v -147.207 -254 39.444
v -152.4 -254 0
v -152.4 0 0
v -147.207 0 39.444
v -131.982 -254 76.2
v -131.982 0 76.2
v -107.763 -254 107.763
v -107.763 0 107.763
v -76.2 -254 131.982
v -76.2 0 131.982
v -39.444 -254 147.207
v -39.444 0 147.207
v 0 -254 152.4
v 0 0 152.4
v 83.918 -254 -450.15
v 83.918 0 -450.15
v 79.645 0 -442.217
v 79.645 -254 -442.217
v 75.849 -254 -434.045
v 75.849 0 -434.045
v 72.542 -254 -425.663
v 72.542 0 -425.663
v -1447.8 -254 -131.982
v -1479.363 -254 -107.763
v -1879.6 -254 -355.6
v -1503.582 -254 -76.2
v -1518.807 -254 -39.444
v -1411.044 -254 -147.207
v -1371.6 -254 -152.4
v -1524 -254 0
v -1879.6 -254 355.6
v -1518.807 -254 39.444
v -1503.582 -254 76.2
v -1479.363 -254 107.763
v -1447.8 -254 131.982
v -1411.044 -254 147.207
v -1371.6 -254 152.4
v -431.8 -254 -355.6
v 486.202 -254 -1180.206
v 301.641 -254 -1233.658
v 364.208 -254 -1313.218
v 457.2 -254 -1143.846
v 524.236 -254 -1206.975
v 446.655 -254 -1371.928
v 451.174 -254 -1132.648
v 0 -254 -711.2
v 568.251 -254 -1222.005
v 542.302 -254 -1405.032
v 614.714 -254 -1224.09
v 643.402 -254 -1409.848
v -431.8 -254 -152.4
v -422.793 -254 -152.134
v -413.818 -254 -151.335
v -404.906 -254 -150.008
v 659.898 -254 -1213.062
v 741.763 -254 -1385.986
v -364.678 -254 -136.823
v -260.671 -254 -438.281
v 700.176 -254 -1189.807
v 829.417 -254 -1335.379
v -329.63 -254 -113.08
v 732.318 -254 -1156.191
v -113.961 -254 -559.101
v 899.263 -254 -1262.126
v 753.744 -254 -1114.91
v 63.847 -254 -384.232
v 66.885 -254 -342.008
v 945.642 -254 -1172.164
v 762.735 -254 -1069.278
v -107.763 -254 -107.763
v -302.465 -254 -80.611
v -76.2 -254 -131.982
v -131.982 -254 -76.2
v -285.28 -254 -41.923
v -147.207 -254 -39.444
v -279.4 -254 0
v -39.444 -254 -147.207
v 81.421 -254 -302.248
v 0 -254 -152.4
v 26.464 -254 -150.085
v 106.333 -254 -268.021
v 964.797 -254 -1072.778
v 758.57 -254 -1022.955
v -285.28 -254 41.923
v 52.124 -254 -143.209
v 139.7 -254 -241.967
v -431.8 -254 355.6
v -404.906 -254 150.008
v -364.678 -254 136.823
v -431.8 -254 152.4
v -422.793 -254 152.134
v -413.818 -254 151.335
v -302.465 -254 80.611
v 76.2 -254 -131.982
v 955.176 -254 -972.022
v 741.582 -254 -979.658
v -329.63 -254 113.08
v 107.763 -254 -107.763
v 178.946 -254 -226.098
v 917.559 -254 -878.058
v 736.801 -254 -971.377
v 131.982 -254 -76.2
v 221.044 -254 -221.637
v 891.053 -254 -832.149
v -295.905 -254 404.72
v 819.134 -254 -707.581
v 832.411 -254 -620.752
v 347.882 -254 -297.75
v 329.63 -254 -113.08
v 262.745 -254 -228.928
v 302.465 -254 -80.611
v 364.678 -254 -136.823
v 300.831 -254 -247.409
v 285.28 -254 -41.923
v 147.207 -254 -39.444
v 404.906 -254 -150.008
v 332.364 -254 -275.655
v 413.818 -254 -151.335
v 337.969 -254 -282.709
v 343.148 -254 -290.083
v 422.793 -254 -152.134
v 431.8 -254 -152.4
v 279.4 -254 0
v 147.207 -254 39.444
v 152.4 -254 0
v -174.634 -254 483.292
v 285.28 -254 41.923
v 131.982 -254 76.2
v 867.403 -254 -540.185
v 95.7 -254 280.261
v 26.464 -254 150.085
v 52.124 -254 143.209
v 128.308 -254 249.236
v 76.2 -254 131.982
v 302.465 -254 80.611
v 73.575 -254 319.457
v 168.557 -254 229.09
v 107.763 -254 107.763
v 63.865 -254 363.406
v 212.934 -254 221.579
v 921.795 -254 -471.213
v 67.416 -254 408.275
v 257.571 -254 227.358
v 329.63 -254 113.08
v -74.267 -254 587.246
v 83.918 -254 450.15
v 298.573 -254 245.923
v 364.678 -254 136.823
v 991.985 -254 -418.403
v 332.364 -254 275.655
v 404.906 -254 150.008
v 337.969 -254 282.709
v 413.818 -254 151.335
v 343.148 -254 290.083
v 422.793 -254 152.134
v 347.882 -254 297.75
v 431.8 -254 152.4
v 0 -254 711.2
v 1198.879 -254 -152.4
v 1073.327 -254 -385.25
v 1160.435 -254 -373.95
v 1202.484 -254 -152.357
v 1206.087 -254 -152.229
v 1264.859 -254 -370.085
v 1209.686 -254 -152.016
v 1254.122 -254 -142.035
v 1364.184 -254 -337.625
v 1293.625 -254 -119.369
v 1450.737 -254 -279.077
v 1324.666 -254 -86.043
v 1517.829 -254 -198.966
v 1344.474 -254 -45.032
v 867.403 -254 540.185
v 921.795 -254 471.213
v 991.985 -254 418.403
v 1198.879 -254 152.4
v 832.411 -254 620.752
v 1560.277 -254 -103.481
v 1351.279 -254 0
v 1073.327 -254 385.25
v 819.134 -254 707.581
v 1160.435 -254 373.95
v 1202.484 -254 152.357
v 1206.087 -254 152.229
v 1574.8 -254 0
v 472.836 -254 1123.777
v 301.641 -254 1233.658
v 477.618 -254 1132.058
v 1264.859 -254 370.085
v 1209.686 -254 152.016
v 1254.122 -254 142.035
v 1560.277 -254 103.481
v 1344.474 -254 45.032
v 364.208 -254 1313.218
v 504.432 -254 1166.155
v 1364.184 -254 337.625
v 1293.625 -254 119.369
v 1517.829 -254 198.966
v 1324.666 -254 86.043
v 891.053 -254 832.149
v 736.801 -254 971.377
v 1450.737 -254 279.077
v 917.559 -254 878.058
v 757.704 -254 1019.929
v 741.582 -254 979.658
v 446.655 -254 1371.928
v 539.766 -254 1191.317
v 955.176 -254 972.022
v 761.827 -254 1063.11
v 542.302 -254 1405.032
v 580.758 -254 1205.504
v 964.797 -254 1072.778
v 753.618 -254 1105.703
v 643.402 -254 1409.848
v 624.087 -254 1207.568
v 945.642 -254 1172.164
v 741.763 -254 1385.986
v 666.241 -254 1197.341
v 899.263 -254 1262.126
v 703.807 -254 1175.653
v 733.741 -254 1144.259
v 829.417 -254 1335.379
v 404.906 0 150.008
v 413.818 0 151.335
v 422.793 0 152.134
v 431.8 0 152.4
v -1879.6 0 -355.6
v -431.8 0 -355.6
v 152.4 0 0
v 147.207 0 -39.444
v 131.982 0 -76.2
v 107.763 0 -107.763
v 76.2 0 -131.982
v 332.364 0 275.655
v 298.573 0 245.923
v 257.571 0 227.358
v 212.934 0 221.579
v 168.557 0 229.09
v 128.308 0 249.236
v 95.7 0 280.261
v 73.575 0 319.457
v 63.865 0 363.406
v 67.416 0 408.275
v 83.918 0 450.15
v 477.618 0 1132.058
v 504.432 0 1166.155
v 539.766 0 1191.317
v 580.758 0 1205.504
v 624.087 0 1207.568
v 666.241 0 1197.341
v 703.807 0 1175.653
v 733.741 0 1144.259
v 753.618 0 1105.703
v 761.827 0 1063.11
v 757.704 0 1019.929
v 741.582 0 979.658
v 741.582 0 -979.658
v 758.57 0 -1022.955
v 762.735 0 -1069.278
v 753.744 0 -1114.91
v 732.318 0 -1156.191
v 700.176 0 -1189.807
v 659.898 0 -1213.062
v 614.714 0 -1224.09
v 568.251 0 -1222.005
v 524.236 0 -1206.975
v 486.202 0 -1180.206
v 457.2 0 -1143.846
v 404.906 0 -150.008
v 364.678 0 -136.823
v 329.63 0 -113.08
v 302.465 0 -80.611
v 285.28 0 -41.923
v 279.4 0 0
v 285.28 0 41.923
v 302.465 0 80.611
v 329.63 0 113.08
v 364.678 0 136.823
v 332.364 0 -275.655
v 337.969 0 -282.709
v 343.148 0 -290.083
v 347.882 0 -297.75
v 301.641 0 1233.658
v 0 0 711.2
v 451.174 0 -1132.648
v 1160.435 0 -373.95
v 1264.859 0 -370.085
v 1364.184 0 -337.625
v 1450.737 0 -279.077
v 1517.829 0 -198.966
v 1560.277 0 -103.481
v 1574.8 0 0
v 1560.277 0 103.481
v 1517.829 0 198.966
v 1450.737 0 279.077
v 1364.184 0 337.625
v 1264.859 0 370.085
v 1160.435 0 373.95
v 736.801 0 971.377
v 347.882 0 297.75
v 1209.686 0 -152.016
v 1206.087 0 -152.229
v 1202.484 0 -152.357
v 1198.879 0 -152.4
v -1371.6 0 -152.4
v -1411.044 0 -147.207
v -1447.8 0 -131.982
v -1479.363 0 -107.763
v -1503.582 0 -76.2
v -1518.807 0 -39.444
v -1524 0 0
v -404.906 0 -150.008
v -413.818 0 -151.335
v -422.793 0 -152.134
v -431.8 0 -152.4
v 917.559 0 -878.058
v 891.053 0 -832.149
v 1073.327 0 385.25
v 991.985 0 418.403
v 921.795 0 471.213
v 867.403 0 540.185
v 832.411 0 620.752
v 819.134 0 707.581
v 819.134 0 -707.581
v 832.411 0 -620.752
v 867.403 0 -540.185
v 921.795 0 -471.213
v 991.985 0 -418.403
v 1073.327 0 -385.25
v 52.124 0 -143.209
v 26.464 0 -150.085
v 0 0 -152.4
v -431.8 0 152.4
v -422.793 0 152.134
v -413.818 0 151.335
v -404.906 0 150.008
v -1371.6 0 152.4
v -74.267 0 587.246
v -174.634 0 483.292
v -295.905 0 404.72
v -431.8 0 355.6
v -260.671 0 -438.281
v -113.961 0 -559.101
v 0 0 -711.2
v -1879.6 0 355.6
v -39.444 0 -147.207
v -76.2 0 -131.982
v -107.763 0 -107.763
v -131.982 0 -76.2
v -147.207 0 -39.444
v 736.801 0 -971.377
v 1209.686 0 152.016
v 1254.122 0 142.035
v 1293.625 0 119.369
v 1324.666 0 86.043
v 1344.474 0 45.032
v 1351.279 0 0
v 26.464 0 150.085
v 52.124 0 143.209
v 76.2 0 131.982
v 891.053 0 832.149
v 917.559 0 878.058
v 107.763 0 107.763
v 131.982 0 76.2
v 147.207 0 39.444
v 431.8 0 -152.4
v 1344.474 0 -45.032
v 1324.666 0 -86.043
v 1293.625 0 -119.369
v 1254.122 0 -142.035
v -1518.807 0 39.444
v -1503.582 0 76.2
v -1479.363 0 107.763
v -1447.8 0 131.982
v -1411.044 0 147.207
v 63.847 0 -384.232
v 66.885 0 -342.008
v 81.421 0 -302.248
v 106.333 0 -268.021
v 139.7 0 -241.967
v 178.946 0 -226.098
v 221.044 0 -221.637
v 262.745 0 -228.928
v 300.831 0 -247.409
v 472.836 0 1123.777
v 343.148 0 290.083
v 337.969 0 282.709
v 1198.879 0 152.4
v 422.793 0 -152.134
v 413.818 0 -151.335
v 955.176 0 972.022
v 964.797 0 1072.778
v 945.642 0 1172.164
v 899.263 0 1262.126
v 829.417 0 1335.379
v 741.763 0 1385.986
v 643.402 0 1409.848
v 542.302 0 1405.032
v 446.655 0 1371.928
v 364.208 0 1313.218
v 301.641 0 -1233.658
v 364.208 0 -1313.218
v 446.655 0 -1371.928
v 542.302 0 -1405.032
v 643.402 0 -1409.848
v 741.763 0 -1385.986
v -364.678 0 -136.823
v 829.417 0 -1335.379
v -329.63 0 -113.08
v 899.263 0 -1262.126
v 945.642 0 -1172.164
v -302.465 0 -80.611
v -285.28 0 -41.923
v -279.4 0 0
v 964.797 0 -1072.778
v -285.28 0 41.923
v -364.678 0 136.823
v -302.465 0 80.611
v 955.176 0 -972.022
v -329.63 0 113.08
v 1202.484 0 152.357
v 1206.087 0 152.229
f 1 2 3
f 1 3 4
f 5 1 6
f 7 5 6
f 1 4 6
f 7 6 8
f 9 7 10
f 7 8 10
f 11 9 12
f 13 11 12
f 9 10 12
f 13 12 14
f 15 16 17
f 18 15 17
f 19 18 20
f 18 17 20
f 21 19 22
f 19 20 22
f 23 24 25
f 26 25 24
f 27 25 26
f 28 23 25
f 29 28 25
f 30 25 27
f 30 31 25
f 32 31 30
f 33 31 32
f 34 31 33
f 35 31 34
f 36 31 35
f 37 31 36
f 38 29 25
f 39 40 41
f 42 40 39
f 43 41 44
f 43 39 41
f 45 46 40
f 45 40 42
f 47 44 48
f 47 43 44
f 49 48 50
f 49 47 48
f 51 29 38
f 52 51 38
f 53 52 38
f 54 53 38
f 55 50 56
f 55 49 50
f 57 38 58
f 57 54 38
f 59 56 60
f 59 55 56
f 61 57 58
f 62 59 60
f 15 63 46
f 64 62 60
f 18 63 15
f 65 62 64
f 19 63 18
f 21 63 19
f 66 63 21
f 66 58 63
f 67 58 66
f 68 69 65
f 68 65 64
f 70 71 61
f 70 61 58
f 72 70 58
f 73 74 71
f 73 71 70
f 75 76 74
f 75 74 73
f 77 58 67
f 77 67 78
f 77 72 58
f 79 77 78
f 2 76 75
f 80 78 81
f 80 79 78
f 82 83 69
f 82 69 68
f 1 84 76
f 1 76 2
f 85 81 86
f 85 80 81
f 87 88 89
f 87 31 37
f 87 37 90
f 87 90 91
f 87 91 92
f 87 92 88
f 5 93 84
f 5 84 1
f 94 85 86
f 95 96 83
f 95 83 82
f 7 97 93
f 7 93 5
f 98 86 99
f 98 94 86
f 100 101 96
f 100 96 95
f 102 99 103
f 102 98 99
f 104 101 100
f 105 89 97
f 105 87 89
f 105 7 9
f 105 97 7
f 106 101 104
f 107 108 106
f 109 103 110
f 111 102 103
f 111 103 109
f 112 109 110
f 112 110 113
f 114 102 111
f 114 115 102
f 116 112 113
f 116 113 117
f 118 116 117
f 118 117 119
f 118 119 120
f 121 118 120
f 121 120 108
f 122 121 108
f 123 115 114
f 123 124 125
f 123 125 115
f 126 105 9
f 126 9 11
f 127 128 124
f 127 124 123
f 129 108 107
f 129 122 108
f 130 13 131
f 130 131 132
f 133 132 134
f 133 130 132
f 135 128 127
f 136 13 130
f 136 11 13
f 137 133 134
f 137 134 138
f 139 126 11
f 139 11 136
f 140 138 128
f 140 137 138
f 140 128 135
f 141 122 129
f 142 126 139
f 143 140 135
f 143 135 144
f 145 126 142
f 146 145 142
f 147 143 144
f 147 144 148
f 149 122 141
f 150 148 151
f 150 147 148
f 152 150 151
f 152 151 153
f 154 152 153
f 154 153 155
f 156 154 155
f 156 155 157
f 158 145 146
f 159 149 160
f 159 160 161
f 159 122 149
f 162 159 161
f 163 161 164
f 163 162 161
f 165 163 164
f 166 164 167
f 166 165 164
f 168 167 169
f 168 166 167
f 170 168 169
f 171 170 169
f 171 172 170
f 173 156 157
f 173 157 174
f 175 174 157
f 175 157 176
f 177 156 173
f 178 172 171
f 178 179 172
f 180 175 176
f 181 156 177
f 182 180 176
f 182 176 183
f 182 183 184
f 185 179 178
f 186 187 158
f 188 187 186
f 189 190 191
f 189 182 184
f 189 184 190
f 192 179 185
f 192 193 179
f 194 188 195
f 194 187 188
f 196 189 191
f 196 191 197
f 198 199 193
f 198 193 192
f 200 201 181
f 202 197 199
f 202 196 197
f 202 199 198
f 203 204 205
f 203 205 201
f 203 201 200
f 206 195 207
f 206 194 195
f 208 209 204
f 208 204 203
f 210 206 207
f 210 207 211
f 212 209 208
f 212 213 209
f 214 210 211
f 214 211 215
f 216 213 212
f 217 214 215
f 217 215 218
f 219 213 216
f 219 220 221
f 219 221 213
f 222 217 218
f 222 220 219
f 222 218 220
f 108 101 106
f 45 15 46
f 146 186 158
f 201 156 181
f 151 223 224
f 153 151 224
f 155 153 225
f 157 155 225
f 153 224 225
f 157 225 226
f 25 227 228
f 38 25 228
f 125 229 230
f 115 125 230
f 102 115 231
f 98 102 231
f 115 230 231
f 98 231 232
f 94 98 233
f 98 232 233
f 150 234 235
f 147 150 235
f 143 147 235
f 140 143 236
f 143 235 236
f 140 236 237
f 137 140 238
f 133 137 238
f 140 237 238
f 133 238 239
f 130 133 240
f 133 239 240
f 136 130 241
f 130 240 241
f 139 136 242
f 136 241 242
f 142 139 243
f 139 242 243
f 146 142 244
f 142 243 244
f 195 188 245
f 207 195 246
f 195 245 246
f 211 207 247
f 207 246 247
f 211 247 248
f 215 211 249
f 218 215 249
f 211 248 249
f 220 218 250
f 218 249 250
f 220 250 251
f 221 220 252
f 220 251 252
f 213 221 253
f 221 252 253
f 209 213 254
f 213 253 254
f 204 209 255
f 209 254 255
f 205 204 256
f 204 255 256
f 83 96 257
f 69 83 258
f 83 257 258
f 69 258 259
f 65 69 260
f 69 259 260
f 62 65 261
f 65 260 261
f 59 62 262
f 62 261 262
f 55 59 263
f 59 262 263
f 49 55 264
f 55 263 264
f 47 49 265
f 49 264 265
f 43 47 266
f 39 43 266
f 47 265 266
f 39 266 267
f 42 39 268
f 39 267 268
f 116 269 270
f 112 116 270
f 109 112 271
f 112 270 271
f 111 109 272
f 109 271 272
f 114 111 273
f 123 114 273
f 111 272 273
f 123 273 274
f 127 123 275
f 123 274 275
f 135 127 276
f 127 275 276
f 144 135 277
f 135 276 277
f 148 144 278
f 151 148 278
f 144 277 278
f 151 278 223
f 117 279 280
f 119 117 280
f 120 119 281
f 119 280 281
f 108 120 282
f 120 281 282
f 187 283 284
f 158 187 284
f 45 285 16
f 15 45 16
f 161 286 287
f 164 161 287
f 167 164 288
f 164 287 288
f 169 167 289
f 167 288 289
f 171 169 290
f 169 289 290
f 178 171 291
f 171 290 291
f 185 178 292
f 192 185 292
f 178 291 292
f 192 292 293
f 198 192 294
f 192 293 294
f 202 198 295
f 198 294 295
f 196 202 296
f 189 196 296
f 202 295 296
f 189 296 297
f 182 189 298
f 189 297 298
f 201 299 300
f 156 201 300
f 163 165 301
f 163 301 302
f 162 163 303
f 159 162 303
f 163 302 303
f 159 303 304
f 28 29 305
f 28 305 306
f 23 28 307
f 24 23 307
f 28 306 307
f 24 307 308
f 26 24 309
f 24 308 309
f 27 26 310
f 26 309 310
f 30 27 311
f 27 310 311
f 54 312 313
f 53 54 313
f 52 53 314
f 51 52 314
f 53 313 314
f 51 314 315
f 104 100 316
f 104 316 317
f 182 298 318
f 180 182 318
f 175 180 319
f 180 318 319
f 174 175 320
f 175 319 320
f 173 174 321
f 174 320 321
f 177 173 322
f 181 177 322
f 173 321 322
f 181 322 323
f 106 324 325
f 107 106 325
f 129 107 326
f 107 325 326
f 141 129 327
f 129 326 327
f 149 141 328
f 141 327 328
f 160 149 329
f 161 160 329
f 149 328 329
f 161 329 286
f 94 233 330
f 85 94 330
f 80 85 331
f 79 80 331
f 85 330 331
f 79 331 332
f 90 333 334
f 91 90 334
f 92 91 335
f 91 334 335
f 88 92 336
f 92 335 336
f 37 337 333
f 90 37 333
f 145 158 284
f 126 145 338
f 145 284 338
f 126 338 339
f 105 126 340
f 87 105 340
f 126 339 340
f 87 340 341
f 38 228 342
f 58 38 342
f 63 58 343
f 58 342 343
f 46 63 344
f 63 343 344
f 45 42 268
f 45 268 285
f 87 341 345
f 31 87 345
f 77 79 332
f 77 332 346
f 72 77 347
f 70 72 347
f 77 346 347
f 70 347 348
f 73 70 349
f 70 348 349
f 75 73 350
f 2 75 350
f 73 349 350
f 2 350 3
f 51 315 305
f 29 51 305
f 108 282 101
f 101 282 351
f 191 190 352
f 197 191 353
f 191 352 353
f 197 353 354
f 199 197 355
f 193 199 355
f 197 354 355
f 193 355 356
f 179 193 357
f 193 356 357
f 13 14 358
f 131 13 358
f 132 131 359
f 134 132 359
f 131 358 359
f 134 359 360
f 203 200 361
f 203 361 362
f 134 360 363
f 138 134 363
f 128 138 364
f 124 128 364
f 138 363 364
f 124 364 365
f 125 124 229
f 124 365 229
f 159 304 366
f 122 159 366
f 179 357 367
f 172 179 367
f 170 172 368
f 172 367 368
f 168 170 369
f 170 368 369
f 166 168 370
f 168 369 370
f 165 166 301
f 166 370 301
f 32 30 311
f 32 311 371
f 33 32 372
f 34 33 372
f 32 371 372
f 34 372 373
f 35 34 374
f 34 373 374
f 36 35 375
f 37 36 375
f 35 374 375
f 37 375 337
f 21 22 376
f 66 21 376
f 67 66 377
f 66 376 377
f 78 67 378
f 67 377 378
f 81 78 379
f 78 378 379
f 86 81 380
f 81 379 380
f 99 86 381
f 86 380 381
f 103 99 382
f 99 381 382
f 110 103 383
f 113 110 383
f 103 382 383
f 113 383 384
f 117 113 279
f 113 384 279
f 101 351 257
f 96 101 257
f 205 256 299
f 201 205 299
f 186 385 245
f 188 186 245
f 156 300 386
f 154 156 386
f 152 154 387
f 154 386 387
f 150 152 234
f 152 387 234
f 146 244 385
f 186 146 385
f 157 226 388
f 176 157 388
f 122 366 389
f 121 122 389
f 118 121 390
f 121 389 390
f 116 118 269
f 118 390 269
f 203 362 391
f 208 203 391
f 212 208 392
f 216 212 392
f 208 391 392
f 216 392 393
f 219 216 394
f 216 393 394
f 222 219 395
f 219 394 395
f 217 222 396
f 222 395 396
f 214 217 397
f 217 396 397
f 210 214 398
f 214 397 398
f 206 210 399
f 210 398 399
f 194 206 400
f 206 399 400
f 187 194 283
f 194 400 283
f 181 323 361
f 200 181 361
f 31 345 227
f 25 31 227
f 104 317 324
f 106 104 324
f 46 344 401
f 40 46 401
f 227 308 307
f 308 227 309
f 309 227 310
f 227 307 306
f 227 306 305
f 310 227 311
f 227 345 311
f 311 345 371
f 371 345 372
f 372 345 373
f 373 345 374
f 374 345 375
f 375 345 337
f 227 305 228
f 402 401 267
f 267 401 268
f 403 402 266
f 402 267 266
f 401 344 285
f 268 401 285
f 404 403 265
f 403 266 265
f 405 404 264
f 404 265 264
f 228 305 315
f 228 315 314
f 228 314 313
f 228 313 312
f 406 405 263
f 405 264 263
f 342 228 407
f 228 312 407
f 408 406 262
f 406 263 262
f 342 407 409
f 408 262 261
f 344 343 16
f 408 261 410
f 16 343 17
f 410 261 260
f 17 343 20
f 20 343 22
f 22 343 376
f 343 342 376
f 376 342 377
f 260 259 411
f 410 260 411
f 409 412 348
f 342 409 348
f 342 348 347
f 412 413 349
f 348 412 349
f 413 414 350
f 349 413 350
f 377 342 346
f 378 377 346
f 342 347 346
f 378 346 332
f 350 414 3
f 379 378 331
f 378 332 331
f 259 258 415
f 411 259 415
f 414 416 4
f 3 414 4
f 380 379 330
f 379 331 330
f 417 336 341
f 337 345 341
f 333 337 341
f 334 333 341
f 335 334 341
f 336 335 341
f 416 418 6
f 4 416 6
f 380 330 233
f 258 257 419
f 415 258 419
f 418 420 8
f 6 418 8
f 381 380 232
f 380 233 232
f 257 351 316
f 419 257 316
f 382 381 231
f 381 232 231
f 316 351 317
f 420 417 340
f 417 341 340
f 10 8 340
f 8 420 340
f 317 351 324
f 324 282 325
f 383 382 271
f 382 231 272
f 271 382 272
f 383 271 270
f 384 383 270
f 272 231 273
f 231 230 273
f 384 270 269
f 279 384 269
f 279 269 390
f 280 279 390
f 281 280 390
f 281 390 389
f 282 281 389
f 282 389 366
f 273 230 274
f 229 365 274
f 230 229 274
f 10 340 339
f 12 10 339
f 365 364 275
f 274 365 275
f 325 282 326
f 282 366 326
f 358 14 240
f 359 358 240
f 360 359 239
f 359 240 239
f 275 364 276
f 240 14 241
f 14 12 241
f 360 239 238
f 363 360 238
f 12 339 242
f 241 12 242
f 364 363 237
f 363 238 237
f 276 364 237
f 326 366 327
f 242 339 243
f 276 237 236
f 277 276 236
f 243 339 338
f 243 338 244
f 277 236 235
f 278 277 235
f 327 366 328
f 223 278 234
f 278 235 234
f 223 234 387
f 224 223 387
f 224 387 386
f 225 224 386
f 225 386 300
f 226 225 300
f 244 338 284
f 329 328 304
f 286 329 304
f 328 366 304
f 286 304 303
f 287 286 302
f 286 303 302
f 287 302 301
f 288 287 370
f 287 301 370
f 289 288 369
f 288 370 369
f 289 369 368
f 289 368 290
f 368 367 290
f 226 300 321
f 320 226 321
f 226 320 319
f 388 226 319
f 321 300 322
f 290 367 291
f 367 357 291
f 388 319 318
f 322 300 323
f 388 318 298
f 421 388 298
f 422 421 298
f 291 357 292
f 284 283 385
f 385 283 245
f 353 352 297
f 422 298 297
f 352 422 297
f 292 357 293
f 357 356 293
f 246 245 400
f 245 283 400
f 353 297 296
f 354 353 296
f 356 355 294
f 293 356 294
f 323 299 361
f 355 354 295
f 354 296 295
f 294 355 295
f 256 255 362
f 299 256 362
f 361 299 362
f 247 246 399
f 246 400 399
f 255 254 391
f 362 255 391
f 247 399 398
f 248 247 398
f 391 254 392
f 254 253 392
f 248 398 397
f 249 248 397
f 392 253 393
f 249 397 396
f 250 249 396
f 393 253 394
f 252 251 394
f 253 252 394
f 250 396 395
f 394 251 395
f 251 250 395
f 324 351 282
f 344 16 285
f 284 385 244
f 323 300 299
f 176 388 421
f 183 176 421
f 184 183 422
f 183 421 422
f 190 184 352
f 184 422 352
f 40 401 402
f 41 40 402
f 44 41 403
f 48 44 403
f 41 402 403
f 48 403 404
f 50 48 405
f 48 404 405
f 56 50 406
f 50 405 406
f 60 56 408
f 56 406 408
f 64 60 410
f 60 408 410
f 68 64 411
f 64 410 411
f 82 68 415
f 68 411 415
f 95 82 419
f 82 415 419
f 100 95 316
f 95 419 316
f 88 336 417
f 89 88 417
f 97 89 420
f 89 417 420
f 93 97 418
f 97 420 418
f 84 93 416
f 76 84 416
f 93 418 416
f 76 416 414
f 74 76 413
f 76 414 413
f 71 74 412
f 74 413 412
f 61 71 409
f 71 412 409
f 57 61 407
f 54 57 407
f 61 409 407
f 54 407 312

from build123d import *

# Parameters (mm, degrees)
F1_DEPTH = 254


with BuildPart() as f1:
    # F0 (on Front) → F1 (new body)
    with BuildSketch(Plane.XZ):
        with BuildLine():
            ThreePointArc((1160.4353536497, 373.9497693541), (1190.2445719567, 264.1334869485), (1209.6857689596, 152.0163819353))
            ThreePointArc((1209.6857689596, 152.0163819353), (1310.3976121316, 103.8721694551), (1351.2793068509, 0))
            Line((1351.2793068509, 0), (1574.8, 0))
            ThreePointArc((1574.8, 0), (1450.736895582, 279.0772698309), (1160.4353536497, 373.9497693541))
        make_face()
        with BuildLine():
            ThreePointArc((736.8010212461, 971.3768038669), (816.8986691145, 905.0553598532), (891.0532399748, 832.1494838852))
            Line((891.0532399748, 832.1494838852), (917.5586335857, 878.058172294))
            Line((917.5586335857, 878.058172294), (741.5822715367, 979.658172294))
            Line((741.5822715367, 979.658172294), (736.8010212461, 971.3768038669))
        make_face()
        with BuildLine():
            Line((477.6177284633, 1132.058172294), (301.6413664143, 1233.658172294))
            Line((301.6413664143, 1233.658172294), (275.1359728033, 1187.7494838852))
            ThreePointArc((275.1359728033, 1187.7494838852), (375.3515989068, 1159.9826796975), (472.8364781726, 1123.7768038669))
            Line((472.8364781726, 1123.7768038669), (477.6177284633, 1132.058172294))
        make_face()
        with BuildLine():
            Line((275.1359728033, -1187.7494838852), (301.6413664143, -1233.658172294))
            Line((301.6413664143, -1233.658172294), (457.2, -1143.8463533185))
            Line((457.2, -1143.8463533185), (451.1739193379, -1132.647665653))
            ThreePointArc((451.1739193379, -1132.647665653), (364.1985275213, -1163.5325833647), (275.1359728033, -1187.7494838852))
        make_face()
        with BuildLine():
            Line((917.5586335857, -878.058172294), (891.0532399748, -832.1494838852))
            ThreePointArc((891.0532399748, -832.1494838852), (816.8986691145, -905.0553598532), (736.8010212461, -971.3768038669))
            Line((736.8010212461, -971.3768038669), (741.5822715367, -979.658172294))
            Line((741.5822715367, -979.658172294), (917.5586335857, -878.058172294))
        make_face()
        with BuildLine():
            ThreePointArc((1351.2793068509, 0), (1310.3976121316, -103.8721694551), (1209.6857689596, -152.0163819353))
            ThreePointArc((1209.6857689596, -152.0163819353), (1190.2445719567, -264.1334869485), (1160.4353536497, -373.9497693541))
            ThreePointArc((1160.4353536497, -373.9497693541), (1450.736895582, -279.0772698309), (1574.8, 0))
            Line((1574.8, 0), (1351.2793068509, 0))
        make_face()
        with BuildLine():
            Line((741.5822715367, 979.658172294), (917.5586335857, 878.058172294))
            ThreePointArc((917.5586335857, 878.058172294), (787.4, 1363.8168058797), (301.6413664143, 1233.658172294))
            Line((301.6413664143, 1233.658172294), (477.6177284633, 1132.058172294))
            ThreePointArc((477.6177284633, 1132.058172294), (685.8, 1187.8404438307), (741.5822715367, 979.658172294))
        make_face()
        with BuildLine():
            ThreePointArc((301.6413664143, -1233.658172294), (787.4, -1363.8168058797), (917.5586335857, -878.058172294))
            Line((917.5586335857, -878.058172294), (741.5822715367, -979.658172294))
            ThreePointArc((741.5822715367, -979.658172294), (680.8645597623, -1202.8683726303), (457.2, -1143.8463533185))
            Line((457.2, -1143.8463533185), (301.6413664143, -1233.658172294))
        make_face()
        with BuildLine():
            Line((391.876362049, 373.9497693541), (1160.4353536497, 373.9497693541))
            ThreePointArc((1160.4353536497, 373.9497693541), (921.7950857099, 471.2128883299), (819.1336335857, 707.581071559))
            Line((819.1336335857, 707.581071559), (891.0532399748, 832.1494838852))
            ThreePointArc((891.0532399748, 832.1494838852), (816.8986691145, 905.0553598532), (736.8010212461, 971.3768038669))
            Line((736.8010212461, 971.3768038669), (391.876362049, 373.9497693541))
        make_face()
        with BuildLine():
            ThreePointArc((-1209.6374994187, 152.4), (-1192.2502680214, 254.9273198443), (-1166.1892127781, 355.6))
            Line((-1166.1892127781, 355.6), (-1879.6, 355.6))
            Line((-1879.6, 355.6), (-1879.6, 0))
            Line((-1879.6, 0), (-1524, 0))
            ThreePointArc((-1524, 0), (-1479.3630734528, 107.7630734528), (-1371.6, 152.4))
            Line((-1371.6, 152.4), (-1209.6374994187, 152.4))
        make_face()
        with BuildLine():
            Line((-1879.6, -355.6), (-1166.1892127781, -355.6))
            ThreePointArc((-1166.1892127781, -355.6), (-1192.2502680214, -254.9273198443), (-1209.6374994187, -152.4))
            Line((-1209.6374994187, -152.4), (-1371.6, -152.4))
            ThreePointArc((-1371.6, -152.4), (-1479.3630734528, -107.7630734528), (-1524, 0))
            Line((-1524, 0), (-1879.6, 0))
            Line((-1879.6, 0), (-1879.6, -355.6))
        make_face()
        with BuildLine():
            ThreePointArc((0, 431.8), (36.4005750014, 430.2629871829), (72.5420108165, 425.6628908734))
            ThreePointArc((72.5420108165, 425.6628908734), (77.6865180317, 438.1587516089), (83.9177284633, 450.1497693541))
            Line((83.9177284633, 450.1497693541), (472.8364781726, 1123.7768038669))
            ThreePointArc((472.8364781726, 1123.7768038669), (375.3515989068, 1159.9826796975), (275.1359728033, 1187.7494838852))
            Line((275.1359728033, 1187.7494838852), (0, 711.2))
            Line((0, 711.2), (0, 431.8))
        make_face()
        with BuildLine():
            ThreePointArc((-404.9058823529, 150.008221228), (-246.655316255, 354.4183897079), (0, 431.8))
            Line((0, 431.8), (0, 711.2))
            ThreePointArc((0, 711.2), (-174.6344256589, 483.2918025858), (-431.8, 355.6))
            Line((-431.8, 355.6), (-1166.1892127781, 355.6))
            ThreePointArc((-1166.1892127781, 355.6), (-1192.2502680214, 254.9273198443), (-1209.6374994187, 152.4))
            Line((-1209.6374994187, 152.4), (-431.8, 152.4))
            ThreePointArc((-431.8, 152.4), (-418.2998687996, 151.8008776575), (-404.9058823529, 150.008221228))
        make_face()
        with BuildLine():
            Line((0, -711.2), (0, -431.8))
            ThreePointArc((0, -431.8), (-246.655316255, -354.4183897079), (-404.9058823529, -150.008221228))
            ThreePointArc((-404.9058823529, -150.008221228), (-418.2998687996, -151.8008776575), (-431.8, -152.4))
            Line((-431.8, -152.4), (-1209.6374994187, -152.4))
            ThreePointArc((-1209.6374994187, -152.4), (-1192.2502680214, -254.9273198443), (-1166.1892127781, -355.6))
            Line((-1166.1892127781, -355.6), (-431.8, -355.6))
            ThreePointArc((-431.8, -355.6), (-183.7043920276, -494.3053331764), (0, -711.2))
        make_face()
        with BuildLine():
            ThreePointArc((83.9177284633, -450.1497693541), (77.6865180317, -438.1587516089), (72.5420108165, -425.6628908734))
            ThreePointArc((72.5420108165, -425.6628908734), (36.4005750014, -430.2629871829), (0, -431.8))
            Line((0, -431.8), (0, -711.2))
            Line((0, -711.2), (275.1359728033, -1187.7494838852))
            ThreePointArc((275.1359728033, -1187.7494838852), (364.1985275213, -1163.5325833647), (451.1739193379, -1132.647665653))
            Line((451.1739193379, -1132.647665653), (83.9177284633, -450.1497693541))
        make_face()
        with BuildLine():
            ThreePointArc((1198.8793068509, 152.4), (1204.285941343, 152.3040652887), (1209.6857689596, 152.0163819353))
            ThreePointArc((1209.6857689596, 152.0163819353), (1190.2445719567, 264.1334869485), (1160.4353536497, 373.9497693541))
            Line((1160.4353536497, 373.9497693541), (391.876362049, 373.9497693541))
            Line((391.876362049, 373.9497693541), (347.8822715367, 297.7497693541))
            ThreePointArc((347.8822715367, 297.7497693541), (340.6133507679, 286.3578739515), (332.3638715364, 275.6546696454))
            ThreePointArc((332.3638715364, 275.6546696454), (373.9497693541, 215.9), (404.9058823529, 150.008221228))
            ThreePointArc((404.9058823529, 150.008221228), (418.2998687996, 151.8008776575), (431.8, 152.4))
            Line((431.8, 152.4), (1198.8793068509, 152.4))
        make_face()
        with BuildLine():
            ThreePointArc((1160.4353536497, -373.9497693541), (1190.2445719567, -264.1334869485), (1209.6857689596, -152.0163819353))
            ThreePointArc((1209.6857689596, -152.0163819353), (1204.285941343, -152.3040652887), (1198.8793068509, -152.4))
            Line((1198.8793068509, -152.4), (431.8, -152.4))
            ThreePointArc((431.8, -152.4), (418.2998687996, -151.8008776575), (404.9058823529, -150.008221228))
            ThreePointArc((404.9058823529, -150.008221228), (373.9497693541, -215.9), (332.3638715364, -275.6546696454))
            ThreePointArc((332.3638715364, -275.6546696454), (340.6133507679, -286.3578739515), (347.8822715367, -297.7497693541))
            Line((347.8822715367, -297.7497693541), (391.876362049, -373.9497693541))
            Line((391.876362049, -373.9497693541), (1160.4353536497, -373.9497693541))
        make_face()
        with BuildLine():
            ThreePointArc((-404.9058823529, -150.008221228), (-246.655316255, -354.4183897079), (0, -431.8))
            Line((0, -431.8), (0, -152.4))
            ThreePointArc((0, -152.4), (-107.7630734528, -107.7630734528), (-152.4, 0))
            Line((-152.4, 0), (-279.4, 0))
            ThreePointArc((-279.4, 0), (-314.9145356997, -97.793395663), (-404.9058823529, -150.008221228))
        make_face()
        with BuildLine():
            Line((0, 152.4), (0, 431.8))
            ThreePointArc((0, 431.8), (-246.655316255, 354.4183897079), (-404.9058823529, 150.008221228))
            ThreePointArc((-404.9058823529, 150.008221228), (-314.9145356997, 97.793395663), (-279.4, 0))
            Line((-279.4, 0), (-152.4, 0))
            ThreePointArc((-152.4, 0), (-107.7630734528, 107.7630734528), (0, 152.4))
        make_face()
        with BuildLine():
            ThreePointArc((279.4, 0), (314.9145356997, 97.793395663), (404.9058823529, 150.008221228))
            ThreePointArc((404.9058823529, 150.008221228), (373.9497693541, 215.9), (332.3638715364, 275.6546696454))
            ThreePointArc((332.3638715364, 275.6546696454), (242.1488328163, 223.8272901054), (139.7, 241.9674978174))
            Line((139.7, 241.9674978174), (76.2, 131.9822715367))
            ThreePointArc((76.2, 131.9822715367), (131.9822715367, 76.2), (152.4, 0))
            Line((152.4, 0), (279.4, 0))
        make_face()
        with BuildLine():
            ThreePointArc((139.7, 241.9674978174), (72.7657028834, 321.6206857684), (72.5420108165, 425.6628908734))
            ThreePointArc((72.5420108165, 425.6628908734), (36.4005750014, 430.2629871829), (0, 431.8))
            Line((0, 431.8), (0, 152.4))
            ThreePointArc((0, 152.4), (39.4440224736, 147.2070959265), (76.2, 131.9822715367))
            Line((76.2, 131.9822715367), (139.7, 241.9674978174))
        make_face()
        with BuildLine():
            ThreePointArc((332.3638715364, -275.6546696454), (373.9497693541, -215.9), (404.9058823529, -150.008221228))
            ThreePointArc((404.9058823529, -150.008221228), (314.9145356997, -97.793395663), (279.4, 0))
            Line((279.4, 0), (152.4, 0))
            ThreePointArc((152.4, 0), (131.9822715367, -76.2), (76.2, -131.9822715367))
            Line((76.2, -131.9822715367), (139.7, -241.9674978174))
            ThreePointArc((139.7, -241.9674978174), (242.1488328163, -223.8272901054), (332.3638715364, -275.6546696454))
        make_face()
        with BuildLine():
            ThreePointArc((0, -431.8), (36.4005750014, -430.2629871829), (72.5420108165, -425.6628908734))
            ThreePointArc((72.5420108165, -425.6628908734), (72.7657028834, -321.6206857684), (139.7, -241.9674978174))
            Line((139.7, -241.9674978174), (76.2, -131.9822715367))
            ThreePointArc((76.2, -131.9822715367), (39.4440224736, -147.2070959265), (0, -152.4))
            Line((0, -152.4), (0, -431.8))
        make_face()
        with BuildLine():
            ThreePointArc((819.1336335857, -707.581071559), (921.7950857099, -471.2128883299), (1160.4353536497, -373.9497693541))
            Line((1160.4353536497, -373.9497693541), (391.876362049, -373.9497693541))
            Line((391.876362049, -373.9497693541), (736.8010212461, -971.3768038669))
            ThreePointArc((736.8010212461, -971.3768038669), (816.8986691145, -905.0553598532), (891.0532399748, -832.1494838852))
            Line((891.0532399748, -832.1494838852), (819.1336335857, -707.581071559))
        make_face()
    extrude(amount=F1_DEPTH)


solid = f1.part
